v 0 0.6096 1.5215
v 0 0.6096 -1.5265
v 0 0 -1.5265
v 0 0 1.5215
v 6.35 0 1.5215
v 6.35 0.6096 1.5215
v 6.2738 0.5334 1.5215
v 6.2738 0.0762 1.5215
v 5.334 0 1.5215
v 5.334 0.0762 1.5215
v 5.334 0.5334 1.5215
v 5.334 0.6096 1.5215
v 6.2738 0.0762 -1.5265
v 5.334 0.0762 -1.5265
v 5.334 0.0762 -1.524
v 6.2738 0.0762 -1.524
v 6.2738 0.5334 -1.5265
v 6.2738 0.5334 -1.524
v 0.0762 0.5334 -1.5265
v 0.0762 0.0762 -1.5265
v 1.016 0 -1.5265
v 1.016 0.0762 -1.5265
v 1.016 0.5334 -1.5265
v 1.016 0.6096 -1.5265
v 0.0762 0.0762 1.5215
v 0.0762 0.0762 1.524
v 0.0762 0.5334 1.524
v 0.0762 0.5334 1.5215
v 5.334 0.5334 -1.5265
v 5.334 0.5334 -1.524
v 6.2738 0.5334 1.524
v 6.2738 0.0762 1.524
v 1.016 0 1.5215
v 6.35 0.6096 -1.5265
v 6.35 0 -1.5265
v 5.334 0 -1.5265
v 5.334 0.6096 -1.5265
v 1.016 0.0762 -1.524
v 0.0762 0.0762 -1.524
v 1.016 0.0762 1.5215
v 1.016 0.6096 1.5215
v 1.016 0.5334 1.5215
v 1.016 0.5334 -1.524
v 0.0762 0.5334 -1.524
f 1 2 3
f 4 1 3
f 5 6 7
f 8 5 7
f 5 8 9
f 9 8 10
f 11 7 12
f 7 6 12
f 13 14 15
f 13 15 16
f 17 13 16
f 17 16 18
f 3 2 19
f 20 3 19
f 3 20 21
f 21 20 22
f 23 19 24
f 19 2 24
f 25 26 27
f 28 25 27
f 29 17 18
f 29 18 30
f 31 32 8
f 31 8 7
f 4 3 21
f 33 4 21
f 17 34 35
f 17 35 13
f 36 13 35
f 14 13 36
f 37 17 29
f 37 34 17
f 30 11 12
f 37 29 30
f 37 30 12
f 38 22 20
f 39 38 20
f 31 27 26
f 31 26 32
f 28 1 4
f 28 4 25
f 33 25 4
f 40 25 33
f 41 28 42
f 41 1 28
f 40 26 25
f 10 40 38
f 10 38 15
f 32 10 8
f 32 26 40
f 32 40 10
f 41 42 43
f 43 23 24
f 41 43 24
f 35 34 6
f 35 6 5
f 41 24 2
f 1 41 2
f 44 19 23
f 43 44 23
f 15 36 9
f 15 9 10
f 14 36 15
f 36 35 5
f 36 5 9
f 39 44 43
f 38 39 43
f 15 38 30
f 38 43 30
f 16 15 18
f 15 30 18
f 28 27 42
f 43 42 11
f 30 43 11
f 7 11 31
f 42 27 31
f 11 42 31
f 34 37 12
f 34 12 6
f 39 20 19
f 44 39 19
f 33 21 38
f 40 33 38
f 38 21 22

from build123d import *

# Parameters (mm, degrees)
SKETCH1_W           = 6.1976
SKETCH1_H           = 0.4572
BASE_EXTRUDE_DEPTH  = 1.524
BOSS_EXTRUDE1_DEPTH = 3.048


with BuildPart() as part:
    # Sketch1 → Base-Extrude (new body, symmetric)
    with BuildSketch(Plane.XY):
        with Locations((3.175, 0.3048)):
            Rectangle(SKETCH1_W, SKETCH1_H)
    extrude(amount=BASE_EXTRUDE_DEPTH, both=True)

    # Sketch2 → Boss-Extrude1 (add)
    with BuildSketch(Plane(origin=(0, 0, -1.52654), x_dir=(-1, 0, 0), z_dir=(0, 0, -1))):
        Polygon((0, 0), (-1.016, 0), (-1.016, 0.0762), (-0.0762, 0.0762), (-0.0762, 0.5334), (-1.016, 0.5334), (-1.016, 0.6096), (0, 0.6096), align=None)
    boss_extrude1 = extrude(amount=-BOSS_EXTRUDE1_DEPTH)

    # Mirror1: Boss-Extrude1 across plane
    add(boss_extrude1.mirror(Plane(origin=(3.175, 0, 0), x_dir=(0, 0, 1), z_dir=(1, 0, 0))))


solid = part.part
